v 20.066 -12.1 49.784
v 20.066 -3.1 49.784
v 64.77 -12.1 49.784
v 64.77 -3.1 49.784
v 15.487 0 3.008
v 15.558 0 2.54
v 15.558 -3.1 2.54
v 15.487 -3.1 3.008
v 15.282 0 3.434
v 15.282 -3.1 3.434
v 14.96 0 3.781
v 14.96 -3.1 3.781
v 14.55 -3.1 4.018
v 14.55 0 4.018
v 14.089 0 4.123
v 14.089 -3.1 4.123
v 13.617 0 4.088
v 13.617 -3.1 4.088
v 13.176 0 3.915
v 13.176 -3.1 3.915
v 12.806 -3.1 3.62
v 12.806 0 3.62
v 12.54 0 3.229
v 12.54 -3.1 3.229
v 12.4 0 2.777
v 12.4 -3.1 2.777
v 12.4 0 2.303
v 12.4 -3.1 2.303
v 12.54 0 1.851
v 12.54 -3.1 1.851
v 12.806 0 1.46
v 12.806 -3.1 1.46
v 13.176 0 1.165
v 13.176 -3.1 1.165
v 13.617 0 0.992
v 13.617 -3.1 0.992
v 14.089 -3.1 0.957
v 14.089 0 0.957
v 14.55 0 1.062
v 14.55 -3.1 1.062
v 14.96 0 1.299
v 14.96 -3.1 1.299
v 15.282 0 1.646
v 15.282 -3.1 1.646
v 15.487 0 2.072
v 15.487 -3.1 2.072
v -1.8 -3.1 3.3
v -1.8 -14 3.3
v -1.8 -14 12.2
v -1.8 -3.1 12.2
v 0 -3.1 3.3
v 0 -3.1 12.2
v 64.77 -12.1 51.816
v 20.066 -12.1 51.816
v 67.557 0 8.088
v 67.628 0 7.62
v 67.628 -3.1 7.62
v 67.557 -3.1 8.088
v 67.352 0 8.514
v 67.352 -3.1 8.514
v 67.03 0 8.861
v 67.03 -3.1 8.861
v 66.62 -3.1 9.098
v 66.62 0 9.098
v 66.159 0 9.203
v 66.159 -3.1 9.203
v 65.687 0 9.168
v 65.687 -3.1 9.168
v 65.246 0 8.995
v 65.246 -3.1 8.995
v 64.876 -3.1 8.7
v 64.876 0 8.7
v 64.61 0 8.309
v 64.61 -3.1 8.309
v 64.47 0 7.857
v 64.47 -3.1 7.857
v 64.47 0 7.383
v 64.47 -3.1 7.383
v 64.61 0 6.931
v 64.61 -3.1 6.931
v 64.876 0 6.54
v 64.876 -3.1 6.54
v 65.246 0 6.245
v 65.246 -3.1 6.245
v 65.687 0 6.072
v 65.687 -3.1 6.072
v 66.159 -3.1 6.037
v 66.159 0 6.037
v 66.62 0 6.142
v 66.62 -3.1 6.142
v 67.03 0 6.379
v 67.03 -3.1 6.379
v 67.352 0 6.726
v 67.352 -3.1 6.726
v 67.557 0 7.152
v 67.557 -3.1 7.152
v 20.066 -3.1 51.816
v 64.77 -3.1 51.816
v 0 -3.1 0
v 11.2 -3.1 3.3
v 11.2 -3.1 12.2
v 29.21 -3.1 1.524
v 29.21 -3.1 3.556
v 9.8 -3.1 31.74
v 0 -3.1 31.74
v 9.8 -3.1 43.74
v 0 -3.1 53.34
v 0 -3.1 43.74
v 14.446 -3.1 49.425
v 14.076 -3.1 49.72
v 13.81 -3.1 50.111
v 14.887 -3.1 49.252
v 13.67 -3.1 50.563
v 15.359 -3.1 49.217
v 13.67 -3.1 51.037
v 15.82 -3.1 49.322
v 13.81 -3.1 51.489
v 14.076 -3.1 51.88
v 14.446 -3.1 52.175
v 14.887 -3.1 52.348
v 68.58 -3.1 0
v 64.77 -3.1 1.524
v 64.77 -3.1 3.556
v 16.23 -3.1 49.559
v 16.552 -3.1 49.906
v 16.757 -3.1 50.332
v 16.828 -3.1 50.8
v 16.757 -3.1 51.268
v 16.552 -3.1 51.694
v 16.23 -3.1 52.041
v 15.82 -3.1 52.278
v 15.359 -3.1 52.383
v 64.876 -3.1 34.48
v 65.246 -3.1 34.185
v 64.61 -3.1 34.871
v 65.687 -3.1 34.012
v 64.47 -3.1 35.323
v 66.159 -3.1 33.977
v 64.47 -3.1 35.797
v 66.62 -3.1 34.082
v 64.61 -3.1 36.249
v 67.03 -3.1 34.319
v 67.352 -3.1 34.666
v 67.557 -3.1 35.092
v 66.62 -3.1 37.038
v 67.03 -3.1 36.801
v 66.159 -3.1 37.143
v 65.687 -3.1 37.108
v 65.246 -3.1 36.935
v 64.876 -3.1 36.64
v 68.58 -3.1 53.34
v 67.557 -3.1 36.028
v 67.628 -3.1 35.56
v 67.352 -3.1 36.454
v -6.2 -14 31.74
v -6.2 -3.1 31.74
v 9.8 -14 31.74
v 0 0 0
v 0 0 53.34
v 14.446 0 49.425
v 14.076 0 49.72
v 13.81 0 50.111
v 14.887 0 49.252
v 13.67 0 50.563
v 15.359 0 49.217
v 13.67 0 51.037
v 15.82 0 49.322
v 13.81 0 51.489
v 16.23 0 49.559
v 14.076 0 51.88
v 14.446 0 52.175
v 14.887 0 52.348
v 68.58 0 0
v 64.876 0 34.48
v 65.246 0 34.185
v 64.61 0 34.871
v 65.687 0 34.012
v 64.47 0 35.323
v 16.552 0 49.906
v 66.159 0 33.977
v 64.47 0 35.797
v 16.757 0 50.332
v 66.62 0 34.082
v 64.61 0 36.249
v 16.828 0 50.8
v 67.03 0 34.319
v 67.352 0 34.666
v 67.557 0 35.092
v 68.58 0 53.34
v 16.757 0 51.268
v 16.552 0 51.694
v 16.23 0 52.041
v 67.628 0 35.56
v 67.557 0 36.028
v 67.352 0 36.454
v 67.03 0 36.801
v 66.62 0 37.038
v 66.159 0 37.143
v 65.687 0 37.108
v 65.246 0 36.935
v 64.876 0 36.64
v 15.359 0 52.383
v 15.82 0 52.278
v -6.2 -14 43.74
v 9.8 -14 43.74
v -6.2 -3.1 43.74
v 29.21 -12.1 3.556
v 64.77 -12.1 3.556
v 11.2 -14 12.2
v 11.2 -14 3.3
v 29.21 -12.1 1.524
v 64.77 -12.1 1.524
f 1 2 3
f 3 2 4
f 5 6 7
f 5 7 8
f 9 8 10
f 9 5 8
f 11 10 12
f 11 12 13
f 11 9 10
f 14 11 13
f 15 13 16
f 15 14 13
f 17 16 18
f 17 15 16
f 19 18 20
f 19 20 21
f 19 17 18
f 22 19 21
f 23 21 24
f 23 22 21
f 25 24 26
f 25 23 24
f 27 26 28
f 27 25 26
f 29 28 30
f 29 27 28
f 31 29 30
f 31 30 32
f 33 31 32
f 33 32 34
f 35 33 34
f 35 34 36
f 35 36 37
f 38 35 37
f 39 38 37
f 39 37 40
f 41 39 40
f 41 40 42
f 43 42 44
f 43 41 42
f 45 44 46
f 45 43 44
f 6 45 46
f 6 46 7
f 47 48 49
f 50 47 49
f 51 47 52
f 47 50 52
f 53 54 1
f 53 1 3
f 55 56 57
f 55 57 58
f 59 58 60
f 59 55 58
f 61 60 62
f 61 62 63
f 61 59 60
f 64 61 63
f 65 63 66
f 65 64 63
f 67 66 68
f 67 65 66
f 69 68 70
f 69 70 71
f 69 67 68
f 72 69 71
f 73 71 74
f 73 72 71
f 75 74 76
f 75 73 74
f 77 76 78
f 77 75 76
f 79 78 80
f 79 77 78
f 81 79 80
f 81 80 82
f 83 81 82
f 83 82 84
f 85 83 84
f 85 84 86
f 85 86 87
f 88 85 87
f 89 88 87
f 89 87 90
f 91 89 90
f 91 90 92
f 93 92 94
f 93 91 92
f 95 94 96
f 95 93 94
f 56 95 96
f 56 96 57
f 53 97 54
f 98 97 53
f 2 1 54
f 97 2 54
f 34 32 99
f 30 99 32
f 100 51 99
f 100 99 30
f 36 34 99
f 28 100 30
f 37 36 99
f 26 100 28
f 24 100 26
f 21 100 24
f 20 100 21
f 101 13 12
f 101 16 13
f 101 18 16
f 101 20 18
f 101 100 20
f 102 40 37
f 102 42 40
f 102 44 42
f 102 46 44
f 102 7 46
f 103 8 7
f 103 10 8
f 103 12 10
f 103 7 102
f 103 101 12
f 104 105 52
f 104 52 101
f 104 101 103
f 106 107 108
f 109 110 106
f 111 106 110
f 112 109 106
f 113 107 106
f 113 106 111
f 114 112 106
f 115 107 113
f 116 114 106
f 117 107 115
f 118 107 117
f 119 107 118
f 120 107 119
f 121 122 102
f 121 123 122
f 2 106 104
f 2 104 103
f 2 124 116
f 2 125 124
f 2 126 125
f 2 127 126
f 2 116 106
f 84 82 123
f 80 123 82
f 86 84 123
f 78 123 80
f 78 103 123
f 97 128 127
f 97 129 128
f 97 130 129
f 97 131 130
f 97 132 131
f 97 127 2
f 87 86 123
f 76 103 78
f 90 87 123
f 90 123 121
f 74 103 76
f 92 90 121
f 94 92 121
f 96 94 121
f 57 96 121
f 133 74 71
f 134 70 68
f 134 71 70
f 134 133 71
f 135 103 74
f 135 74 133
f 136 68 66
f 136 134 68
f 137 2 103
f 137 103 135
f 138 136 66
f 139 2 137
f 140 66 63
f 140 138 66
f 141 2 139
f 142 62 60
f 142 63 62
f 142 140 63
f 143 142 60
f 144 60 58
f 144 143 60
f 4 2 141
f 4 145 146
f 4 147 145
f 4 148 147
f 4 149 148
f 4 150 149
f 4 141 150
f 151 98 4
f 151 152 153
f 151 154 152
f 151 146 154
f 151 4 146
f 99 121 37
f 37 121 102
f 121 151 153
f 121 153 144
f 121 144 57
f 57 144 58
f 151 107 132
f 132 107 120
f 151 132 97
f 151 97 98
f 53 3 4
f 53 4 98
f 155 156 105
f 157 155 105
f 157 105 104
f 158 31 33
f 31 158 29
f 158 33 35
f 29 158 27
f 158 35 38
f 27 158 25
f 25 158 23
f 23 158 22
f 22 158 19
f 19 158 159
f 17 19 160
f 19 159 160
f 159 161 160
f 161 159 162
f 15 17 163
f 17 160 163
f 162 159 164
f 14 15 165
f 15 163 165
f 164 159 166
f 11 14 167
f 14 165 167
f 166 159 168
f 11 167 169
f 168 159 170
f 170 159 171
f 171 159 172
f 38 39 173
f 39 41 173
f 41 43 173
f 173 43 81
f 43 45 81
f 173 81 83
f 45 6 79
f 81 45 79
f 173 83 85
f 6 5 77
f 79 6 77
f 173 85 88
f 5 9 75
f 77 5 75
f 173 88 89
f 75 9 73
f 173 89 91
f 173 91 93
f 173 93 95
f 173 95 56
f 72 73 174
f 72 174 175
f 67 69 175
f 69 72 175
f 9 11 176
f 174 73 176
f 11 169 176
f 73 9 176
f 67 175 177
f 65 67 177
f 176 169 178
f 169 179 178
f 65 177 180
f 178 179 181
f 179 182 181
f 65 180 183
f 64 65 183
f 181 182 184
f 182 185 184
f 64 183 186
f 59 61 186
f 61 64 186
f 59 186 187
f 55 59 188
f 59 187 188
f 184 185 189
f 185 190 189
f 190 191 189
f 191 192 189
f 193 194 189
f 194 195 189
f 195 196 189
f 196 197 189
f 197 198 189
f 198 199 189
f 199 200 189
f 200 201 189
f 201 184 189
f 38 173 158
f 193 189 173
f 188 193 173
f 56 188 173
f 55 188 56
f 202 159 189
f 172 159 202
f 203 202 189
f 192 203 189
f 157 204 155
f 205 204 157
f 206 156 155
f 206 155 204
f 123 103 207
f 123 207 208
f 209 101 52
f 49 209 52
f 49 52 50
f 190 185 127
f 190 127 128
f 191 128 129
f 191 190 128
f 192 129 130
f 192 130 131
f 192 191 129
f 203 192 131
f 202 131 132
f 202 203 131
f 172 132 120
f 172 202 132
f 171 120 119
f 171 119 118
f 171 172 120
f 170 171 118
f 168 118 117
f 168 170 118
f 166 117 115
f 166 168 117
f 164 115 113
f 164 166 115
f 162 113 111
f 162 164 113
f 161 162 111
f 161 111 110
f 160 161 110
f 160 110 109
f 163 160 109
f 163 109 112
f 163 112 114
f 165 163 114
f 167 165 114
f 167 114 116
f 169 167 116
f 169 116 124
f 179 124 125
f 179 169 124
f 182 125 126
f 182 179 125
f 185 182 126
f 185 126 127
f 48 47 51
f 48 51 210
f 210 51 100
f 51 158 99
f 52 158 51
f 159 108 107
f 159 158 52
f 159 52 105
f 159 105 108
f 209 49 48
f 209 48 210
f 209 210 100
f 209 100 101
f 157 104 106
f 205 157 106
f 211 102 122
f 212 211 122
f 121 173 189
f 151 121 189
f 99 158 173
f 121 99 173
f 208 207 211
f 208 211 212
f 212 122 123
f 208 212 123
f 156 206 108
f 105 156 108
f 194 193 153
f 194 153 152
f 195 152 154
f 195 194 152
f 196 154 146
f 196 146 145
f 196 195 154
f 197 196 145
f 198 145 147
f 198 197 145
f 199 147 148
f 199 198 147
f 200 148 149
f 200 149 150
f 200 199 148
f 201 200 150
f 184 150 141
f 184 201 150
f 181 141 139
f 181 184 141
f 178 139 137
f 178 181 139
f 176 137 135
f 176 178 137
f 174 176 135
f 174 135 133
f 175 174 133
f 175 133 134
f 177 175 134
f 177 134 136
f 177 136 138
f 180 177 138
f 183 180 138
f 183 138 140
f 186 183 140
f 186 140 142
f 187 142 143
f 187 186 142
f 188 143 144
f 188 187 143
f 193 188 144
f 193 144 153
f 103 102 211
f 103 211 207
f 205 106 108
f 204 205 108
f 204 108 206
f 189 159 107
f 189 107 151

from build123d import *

# Parameters (mm, degrees)
F0_W     = 68.58
F0_H     = 53.34
F0_R     = 1.5875
F1_DEPTH = 3.1
F2_W     = 6.2
F2_H     = 12
F2_W_2   = 9.8
F2_W_3   = 11.2
F2_H_2   = 8.9
F2_W_4   = 1.8
F3_DEPTH = 10.9
F4_W     = 44.704
F4_H     = 2.032
F4_W_2   = 35.56
F5_DEPTH = 9


with BuildPart() as f1:
    # F0 (on Front) → F1 (new body)
    with BuildSketch(Plane.XZ):
        with Locations((34.29, 26.67)):
            Rectangle(F0_W, F0_H)
        with Locations((13.97, 2.54)):
            Circle(F0_R, mode=Mode.SUBTRACT)
        with Locations((66.04, 7.62)):
            Circle(F0_R, mode=Mode.SUBTRACT)
        with Locations((15.24, 50.8)):
            Circle(F0_R, mode=Mode.SUBTRACT)
        with Locations((66.04, 35.56)):
            Circle(F0_R, mode=Mode.SUBTRACT)
    extrude(amount=F1_DEPTH)

    # F2 (on face) → F3 (join)
    with BuildSketch(Plane.XZ.offset(3.1)):
        with Locations((-3.1, 37.74)):
            Rectangle(F2_W, F2_H)
        with Locations((4.9, 37.74)):
            Rectangle(F2_W_2, F2_H)
        with Locations((5.6, 7.75)):
            Rectangle(F2_W_3, F2_H_2)
        with Locations((-0.9, 7.75)):
            Rectangle(F2_W_4, F2_H_2)
    extrude(amount=F3_DEPTH)

    # F4 (on face) → F5 (join)
    with BuildSketch(Plane.XZ.offset(3.1)):
        with Locations((42.418, 50.8)):
            Rectangle(F4_W, F4_H)
        with Locations((46.99, 2.54)):
            Rectangle(F4_W_2, F4_H)
    extrude(amount=F5_DEPTH)


solid = f1.part
